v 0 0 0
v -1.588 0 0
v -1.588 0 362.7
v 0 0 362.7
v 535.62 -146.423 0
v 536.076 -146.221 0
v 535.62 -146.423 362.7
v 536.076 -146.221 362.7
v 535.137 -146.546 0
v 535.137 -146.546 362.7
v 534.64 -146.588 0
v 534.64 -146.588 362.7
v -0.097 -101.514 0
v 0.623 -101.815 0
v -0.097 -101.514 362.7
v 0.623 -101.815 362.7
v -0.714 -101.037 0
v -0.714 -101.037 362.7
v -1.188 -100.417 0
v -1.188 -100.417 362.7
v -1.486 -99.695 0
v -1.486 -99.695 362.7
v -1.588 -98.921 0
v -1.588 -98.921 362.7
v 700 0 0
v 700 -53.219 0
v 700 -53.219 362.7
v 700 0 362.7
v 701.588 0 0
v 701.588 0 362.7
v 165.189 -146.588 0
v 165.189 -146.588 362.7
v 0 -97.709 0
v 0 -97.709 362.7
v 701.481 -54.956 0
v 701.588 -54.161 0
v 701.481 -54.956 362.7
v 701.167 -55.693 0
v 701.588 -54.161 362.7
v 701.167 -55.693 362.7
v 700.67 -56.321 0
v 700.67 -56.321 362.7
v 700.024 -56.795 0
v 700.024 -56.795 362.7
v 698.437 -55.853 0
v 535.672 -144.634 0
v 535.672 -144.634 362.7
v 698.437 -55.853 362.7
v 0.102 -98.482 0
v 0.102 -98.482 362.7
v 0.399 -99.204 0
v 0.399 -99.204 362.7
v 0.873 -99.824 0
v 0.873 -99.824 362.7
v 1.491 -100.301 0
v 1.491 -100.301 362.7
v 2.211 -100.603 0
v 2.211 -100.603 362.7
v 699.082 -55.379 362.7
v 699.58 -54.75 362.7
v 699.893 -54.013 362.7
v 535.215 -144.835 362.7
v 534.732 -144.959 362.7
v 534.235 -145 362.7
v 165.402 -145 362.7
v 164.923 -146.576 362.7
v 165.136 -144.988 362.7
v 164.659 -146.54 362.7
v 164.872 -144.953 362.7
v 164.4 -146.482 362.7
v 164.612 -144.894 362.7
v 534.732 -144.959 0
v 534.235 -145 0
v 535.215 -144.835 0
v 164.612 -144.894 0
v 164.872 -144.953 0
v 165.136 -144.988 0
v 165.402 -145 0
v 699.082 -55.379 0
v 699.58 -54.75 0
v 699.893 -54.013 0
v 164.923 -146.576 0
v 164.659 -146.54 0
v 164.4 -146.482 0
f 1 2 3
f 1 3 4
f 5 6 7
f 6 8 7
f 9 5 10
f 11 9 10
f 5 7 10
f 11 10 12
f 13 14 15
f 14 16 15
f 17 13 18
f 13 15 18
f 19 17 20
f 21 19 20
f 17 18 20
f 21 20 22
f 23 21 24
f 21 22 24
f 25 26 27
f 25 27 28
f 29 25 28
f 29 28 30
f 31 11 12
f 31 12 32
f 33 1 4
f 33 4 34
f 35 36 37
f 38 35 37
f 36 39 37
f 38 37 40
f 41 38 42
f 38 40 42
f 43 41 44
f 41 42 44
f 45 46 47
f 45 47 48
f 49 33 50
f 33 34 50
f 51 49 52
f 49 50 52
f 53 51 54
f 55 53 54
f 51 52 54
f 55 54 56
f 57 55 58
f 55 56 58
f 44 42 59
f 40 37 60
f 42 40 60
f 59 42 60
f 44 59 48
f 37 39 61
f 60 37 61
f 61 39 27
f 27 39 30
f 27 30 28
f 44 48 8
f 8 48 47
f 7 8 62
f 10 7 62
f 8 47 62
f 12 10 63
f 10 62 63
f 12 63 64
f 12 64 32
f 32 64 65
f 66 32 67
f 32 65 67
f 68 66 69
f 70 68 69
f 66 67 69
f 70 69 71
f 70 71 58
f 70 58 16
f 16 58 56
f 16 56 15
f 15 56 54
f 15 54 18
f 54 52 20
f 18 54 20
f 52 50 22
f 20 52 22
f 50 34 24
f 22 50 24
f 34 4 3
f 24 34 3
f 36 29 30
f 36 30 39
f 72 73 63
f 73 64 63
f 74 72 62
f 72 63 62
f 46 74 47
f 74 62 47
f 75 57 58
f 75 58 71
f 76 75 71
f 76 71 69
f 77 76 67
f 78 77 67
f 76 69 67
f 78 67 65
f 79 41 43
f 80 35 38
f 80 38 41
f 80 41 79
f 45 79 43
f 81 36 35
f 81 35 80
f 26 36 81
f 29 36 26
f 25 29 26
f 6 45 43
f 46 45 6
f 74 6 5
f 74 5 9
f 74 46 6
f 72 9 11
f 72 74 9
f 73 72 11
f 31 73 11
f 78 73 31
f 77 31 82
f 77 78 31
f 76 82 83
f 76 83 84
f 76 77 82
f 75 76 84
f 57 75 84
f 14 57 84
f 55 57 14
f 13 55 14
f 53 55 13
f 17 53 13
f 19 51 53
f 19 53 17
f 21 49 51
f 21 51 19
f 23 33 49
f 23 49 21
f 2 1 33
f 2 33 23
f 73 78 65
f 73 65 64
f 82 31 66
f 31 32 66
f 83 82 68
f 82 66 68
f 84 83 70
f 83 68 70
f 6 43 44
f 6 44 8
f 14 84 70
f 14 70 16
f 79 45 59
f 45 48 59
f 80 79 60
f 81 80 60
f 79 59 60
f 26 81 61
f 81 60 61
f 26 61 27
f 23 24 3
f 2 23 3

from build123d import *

# Parameters (mm, degrees)
EXTRUDE_THIN1_DEPTH = 362.7
FILLET1_R           = 3


with BuildPart() as part:
    # Sketch1 → Extrude-Thin1 (new body)
    with BuildSketch(Plane.XY):
        Polygon((0, 0), (0, -100), (165, -145), (535, -145), (700, -55), (700, 0), (701.5875, 0), (701.5875, -55.942392544), (535.404802998, -146.5875), (164.787405042, -146.5875), (-1.5875, -101.212525898), (-1.5875, 0), align=None)
    extrude(amount=EXTRUDE_THIN1_DEPTH)

    # Fillet1
    fillet1_edges = [part.edges().sort_by_distance(p)[0] for p in [
        (700, -55, 181.35),
        (535, -145, 181.35),
        (165, -145, 181.35),
        (0, -100, 181.35),
        (-1.5875, -101.212525898, 181.35),
        (164.787405042, -146.5875, 181.35),
        (535.404802998, -146.5875, 181.35),
        (701.5875, -55.942392544, 181.35),
    ]]
    fillet(fillet1_edges, radius=FILLET1_R)


solid = part.part
